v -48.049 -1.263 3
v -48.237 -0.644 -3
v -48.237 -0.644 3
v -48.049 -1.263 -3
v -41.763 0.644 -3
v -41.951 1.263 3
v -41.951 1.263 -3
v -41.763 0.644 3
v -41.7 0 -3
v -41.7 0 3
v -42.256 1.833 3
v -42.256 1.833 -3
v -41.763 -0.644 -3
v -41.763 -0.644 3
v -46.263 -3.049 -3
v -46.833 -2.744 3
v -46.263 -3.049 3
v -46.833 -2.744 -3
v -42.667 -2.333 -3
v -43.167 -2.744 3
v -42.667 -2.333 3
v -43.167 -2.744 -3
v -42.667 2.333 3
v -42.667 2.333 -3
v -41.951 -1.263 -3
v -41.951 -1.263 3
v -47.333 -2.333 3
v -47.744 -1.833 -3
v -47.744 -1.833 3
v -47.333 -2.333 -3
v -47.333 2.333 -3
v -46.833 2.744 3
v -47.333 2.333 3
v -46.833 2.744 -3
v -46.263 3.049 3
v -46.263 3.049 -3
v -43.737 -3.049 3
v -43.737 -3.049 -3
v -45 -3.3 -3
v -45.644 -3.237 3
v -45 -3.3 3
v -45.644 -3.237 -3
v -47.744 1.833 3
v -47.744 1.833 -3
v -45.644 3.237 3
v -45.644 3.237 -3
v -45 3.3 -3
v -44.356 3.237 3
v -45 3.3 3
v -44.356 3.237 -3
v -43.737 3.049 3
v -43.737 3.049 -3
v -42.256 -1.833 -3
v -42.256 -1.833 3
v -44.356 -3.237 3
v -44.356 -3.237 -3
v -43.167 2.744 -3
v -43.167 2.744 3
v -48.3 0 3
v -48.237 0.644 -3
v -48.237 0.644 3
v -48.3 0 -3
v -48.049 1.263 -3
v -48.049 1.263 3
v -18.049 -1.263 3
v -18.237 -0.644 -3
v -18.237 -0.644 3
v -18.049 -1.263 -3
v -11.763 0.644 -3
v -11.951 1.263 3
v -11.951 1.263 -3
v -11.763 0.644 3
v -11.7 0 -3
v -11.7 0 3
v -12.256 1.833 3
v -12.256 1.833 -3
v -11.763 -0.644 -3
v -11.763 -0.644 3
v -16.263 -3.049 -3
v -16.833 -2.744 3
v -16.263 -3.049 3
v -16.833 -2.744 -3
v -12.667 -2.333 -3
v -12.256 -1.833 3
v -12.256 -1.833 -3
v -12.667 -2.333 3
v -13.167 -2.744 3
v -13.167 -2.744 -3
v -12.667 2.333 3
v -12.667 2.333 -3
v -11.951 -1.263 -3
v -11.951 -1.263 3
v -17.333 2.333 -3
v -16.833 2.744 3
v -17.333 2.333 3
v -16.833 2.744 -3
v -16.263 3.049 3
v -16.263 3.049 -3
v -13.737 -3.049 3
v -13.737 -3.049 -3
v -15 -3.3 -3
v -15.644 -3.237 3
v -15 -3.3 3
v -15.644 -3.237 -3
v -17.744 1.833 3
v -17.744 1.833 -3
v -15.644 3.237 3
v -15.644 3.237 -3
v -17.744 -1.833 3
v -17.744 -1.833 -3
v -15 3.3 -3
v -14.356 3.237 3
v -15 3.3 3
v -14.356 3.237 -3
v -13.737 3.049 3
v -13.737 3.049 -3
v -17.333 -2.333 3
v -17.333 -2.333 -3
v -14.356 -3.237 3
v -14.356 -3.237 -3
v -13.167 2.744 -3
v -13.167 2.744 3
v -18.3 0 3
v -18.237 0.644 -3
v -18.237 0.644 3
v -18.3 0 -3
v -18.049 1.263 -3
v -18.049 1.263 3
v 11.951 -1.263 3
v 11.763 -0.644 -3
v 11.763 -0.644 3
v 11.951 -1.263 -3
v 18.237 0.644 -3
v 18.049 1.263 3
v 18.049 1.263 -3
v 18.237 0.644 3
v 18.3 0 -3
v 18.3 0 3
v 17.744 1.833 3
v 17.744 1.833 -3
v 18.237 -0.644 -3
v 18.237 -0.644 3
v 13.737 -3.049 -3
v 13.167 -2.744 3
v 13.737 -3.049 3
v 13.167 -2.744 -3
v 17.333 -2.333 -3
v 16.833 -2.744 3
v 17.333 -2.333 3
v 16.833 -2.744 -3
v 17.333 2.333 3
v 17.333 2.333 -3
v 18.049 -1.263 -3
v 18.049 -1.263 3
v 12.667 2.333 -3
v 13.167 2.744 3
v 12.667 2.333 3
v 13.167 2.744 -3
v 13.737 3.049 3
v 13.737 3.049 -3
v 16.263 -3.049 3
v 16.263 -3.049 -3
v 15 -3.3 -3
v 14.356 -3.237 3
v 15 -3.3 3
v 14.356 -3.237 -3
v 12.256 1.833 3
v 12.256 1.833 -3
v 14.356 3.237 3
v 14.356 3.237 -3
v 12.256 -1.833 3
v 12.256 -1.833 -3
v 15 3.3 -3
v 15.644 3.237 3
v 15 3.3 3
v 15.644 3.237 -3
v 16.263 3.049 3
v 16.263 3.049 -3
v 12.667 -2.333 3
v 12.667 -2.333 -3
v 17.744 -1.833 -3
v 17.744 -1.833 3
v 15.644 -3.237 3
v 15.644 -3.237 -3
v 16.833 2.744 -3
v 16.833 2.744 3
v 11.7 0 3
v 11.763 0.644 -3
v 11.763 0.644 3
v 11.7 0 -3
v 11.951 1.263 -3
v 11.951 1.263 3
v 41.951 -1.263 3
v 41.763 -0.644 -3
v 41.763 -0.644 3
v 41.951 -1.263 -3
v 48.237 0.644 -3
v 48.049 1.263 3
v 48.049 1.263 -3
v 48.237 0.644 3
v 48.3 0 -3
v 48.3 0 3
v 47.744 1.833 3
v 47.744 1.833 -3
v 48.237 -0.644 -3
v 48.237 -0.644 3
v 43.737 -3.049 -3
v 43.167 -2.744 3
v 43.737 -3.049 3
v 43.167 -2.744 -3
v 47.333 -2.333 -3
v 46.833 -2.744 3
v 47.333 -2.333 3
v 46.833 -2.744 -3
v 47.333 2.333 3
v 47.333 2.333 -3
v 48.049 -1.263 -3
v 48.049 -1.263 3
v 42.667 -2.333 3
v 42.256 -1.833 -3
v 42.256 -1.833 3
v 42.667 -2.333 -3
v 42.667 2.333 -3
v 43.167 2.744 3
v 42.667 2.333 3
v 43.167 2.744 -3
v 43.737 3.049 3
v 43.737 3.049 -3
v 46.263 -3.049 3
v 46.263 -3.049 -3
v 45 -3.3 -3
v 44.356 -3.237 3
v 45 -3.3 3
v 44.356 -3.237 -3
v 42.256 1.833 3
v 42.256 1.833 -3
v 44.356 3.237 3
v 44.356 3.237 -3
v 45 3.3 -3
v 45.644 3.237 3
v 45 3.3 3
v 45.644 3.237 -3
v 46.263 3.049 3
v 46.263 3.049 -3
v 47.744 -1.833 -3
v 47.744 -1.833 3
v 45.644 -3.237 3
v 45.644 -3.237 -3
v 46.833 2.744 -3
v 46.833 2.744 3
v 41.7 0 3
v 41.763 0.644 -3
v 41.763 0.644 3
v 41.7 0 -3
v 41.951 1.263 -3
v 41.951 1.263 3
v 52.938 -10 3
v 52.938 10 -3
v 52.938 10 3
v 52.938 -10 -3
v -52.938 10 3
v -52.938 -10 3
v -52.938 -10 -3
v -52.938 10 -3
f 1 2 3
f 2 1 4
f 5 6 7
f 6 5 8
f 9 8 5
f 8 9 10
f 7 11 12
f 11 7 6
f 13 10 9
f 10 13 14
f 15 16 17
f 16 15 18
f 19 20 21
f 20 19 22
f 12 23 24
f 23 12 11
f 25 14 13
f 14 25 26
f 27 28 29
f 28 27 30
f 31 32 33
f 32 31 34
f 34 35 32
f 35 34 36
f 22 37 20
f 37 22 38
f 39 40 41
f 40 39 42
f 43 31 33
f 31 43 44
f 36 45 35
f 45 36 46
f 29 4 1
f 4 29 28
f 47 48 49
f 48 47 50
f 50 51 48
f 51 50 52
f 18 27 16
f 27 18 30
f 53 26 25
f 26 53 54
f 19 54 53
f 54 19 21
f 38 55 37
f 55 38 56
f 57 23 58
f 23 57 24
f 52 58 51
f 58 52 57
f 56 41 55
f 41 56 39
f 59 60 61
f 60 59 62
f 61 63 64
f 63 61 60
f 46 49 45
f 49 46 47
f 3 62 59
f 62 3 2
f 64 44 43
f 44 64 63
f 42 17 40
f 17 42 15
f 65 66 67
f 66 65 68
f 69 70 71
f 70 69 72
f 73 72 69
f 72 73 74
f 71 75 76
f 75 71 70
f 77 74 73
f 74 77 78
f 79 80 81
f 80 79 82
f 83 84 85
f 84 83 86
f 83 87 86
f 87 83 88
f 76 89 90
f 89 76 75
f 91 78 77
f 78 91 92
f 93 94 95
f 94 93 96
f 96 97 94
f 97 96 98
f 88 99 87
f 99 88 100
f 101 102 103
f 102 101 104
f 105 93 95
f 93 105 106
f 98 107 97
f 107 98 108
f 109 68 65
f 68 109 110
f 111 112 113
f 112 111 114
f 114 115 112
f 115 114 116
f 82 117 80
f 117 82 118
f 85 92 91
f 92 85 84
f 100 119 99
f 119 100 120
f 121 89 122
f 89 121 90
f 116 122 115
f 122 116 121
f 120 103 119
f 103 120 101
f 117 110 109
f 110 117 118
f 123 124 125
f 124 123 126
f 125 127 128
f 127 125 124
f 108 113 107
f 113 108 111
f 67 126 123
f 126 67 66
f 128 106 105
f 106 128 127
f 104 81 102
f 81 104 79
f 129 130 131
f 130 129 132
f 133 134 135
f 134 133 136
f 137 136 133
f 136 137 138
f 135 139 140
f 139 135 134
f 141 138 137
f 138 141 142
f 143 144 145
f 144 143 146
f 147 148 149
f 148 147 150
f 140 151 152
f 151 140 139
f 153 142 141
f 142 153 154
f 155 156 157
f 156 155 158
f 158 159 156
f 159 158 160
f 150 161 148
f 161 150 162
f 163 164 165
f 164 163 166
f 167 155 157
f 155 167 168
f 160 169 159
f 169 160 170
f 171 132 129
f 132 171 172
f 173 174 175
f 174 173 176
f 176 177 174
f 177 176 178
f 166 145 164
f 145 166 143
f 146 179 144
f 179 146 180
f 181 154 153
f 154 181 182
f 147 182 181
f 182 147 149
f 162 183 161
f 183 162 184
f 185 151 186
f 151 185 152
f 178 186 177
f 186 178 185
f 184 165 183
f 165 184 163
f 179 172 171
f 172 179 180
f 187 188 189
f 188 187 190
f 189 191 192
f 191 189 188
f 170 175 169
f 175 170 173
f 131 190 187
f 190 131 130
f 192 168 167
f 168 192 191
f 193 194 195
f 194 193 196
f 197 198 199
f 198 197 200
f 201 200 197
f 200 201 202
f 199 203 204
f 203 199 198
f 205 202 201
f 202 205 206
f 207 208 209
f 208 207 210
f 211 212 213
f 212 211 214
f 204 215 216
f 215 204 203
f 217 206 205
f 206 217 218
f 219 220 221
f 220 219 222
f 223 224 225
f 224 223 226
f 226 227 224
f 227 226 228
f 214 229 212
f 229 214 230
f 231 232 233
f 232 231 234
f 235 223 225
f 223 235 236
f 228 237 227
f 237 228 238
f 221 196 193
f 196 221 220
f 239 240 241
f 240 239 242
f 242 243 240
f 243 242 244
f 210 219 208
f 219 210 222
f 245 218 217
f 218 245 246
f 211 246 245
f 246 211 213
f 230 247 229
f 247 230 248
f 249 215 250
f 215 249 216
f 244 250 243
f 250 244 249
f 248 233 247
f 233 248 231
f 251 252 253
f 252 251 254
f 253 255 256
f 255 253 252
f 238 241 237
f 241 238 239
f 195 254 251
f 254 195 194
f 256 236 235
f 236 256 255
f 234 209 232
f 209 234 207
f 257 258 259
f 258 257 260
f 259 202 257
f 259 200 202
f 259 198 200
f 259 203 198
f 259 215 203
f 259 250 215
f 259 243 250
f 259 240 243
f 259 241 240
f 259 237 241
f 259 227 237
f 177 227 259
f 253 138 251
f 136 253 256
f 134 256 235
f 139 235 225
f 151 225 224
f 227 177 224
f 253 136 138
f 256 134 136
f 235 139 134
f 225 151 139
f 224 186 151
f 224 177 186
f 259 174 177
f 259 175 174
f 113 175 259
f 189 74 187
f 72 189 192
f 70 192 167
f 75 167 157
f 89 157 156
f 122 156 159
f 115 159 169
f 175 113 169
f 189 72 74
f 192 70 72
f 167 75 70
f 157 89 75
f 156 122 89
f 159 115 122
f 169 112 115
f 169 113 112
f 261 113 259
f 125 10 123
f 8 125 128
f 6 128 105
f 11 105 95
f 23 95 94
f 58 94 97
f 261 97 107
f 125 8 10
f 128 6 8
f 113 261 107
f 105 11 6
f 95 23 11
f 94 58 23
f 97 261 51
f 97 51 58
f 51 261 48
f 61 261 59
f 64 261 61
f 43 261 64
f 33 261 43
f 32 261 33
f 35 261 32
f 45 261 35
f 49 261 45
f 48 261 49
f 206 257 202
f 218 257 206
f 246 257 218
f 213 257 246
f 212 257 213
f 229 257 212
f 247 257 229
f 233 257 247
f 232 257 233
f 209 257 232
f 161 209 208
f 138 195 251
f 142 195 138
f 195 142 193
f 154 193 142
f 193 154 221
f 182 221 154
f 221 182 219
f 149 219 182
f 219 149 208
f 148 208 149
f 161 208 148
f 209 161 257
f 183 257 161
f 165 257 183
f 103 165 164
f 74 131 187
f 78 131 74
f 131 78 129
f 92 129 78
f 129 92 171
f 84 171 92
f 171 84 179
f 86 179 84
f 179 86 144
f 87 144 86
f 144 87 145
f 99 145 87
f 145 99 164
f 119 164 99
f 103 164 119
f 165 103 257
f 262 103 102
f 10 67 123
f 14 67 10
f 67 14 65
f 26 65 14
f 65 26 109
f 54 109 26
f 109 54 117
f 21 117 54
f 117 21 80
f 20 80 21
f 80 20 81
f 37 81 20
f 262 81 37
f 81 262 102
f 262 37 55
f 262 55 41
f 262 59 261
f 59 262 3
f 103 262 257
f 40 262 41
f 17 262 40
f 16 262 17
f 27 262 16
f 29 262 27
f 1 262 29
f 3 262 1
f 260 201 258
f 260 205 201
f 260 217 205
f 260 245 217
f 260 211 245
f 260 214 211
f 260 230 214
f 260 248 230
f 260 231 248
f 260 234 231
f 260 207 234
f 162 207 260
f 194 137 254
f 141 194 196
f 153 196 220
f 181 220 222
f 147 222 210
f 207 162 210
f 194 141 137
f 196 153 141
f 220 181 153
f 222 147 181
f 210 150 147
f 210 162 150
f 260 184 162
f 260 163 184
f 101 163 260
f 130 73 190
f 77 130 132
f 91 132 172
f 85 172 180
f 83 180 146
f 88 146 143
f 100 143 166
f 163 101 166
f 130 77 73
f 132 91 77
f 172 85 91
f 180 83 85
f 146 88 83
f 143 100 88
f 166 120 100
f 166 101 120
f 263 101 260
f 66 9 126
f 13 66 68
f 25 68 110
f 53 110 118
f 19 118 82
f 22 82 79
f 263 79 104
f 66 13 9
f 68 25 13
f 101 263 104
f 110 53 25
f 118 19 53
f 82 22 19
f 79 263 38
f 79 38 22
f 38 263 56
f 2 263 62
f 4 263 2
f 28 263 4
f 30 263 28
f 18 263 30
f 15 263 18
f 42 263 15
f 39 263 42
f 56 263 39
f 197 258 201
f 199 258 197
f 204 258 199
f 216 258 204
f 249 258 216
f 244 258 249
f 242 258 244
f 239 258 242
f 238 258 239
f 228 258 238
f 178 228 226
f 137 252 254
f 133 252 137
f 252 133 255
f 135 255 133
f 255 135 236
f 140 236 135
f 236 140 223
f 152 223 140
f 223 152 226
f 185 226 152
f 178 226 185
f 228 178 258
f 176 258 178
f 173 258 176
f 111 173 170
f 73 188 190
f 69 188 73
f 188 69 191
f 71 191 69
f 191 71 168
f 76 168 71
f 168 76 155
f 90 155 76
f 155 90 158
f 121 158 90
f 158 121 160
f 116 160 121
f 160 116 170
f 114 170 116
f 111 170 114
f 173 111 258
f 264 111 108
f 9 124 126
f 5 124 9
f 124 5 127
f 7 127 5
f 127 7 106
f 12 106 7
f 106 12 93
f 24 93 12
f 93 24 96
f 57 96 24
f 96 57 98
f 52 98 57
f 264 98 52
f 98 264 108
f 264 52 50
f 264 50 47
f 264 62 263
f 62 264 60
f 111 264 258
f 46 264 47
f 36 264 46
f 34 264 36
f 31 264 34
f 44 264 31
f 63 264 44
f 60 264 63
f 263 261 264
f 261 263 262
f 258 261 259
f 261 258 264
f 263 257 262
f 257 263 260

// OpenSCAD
$fn = 32;

// ----------------------------------------------------------------------
// Hole bar, 4 x Ø6.6
// skip layout, 7.9375 mm edge offset
// ----------------------------------------------------------------------

// --- parameters (mm) ---
bar_w = 20;       // bar width (Y)
bar_t = 6;        // bar thickness (Z)
holes = 4;        // holes per row
hole_d = 6.6;     // hole diameter
edge = 7.938;     // offset from the bar end to the first hole
grid_pitch = 15;  // grid the bar was laid out on

// --- derived feature positions (mm) ---
pitch = grid_pitch * 2;       // = 30   holes sit every other grid slot
span = (holes - 1) * pitch;   // = 90   distance between the end holes
bar_l = span + 2 * edge;      // = 105.88   overall bar length
start_x = -bar_l / 2 + edge;  // = -45   X of the first hole
feature_centers = [
  [start_x + 0 * pitch, 0],
  [start_x + 1 * pitch, 0],
  [start_x + 2 * pitch, 0],
  [start_x + 3 * pitch, 0]
];   // hole centres of the first row

// bar with one row of holes, drilled from feature_centers
difference() {
  translate([-bar_l / 2, -bar_w / 2, -bar_t / 2]) cube([bar_l, bar_w, bar_t]);
  for (centre = feature_centers)
    translate([centre[0], centre[1], 0])
      cylinder(d = hole_d, h = bar_t + 2, center = true);
}
